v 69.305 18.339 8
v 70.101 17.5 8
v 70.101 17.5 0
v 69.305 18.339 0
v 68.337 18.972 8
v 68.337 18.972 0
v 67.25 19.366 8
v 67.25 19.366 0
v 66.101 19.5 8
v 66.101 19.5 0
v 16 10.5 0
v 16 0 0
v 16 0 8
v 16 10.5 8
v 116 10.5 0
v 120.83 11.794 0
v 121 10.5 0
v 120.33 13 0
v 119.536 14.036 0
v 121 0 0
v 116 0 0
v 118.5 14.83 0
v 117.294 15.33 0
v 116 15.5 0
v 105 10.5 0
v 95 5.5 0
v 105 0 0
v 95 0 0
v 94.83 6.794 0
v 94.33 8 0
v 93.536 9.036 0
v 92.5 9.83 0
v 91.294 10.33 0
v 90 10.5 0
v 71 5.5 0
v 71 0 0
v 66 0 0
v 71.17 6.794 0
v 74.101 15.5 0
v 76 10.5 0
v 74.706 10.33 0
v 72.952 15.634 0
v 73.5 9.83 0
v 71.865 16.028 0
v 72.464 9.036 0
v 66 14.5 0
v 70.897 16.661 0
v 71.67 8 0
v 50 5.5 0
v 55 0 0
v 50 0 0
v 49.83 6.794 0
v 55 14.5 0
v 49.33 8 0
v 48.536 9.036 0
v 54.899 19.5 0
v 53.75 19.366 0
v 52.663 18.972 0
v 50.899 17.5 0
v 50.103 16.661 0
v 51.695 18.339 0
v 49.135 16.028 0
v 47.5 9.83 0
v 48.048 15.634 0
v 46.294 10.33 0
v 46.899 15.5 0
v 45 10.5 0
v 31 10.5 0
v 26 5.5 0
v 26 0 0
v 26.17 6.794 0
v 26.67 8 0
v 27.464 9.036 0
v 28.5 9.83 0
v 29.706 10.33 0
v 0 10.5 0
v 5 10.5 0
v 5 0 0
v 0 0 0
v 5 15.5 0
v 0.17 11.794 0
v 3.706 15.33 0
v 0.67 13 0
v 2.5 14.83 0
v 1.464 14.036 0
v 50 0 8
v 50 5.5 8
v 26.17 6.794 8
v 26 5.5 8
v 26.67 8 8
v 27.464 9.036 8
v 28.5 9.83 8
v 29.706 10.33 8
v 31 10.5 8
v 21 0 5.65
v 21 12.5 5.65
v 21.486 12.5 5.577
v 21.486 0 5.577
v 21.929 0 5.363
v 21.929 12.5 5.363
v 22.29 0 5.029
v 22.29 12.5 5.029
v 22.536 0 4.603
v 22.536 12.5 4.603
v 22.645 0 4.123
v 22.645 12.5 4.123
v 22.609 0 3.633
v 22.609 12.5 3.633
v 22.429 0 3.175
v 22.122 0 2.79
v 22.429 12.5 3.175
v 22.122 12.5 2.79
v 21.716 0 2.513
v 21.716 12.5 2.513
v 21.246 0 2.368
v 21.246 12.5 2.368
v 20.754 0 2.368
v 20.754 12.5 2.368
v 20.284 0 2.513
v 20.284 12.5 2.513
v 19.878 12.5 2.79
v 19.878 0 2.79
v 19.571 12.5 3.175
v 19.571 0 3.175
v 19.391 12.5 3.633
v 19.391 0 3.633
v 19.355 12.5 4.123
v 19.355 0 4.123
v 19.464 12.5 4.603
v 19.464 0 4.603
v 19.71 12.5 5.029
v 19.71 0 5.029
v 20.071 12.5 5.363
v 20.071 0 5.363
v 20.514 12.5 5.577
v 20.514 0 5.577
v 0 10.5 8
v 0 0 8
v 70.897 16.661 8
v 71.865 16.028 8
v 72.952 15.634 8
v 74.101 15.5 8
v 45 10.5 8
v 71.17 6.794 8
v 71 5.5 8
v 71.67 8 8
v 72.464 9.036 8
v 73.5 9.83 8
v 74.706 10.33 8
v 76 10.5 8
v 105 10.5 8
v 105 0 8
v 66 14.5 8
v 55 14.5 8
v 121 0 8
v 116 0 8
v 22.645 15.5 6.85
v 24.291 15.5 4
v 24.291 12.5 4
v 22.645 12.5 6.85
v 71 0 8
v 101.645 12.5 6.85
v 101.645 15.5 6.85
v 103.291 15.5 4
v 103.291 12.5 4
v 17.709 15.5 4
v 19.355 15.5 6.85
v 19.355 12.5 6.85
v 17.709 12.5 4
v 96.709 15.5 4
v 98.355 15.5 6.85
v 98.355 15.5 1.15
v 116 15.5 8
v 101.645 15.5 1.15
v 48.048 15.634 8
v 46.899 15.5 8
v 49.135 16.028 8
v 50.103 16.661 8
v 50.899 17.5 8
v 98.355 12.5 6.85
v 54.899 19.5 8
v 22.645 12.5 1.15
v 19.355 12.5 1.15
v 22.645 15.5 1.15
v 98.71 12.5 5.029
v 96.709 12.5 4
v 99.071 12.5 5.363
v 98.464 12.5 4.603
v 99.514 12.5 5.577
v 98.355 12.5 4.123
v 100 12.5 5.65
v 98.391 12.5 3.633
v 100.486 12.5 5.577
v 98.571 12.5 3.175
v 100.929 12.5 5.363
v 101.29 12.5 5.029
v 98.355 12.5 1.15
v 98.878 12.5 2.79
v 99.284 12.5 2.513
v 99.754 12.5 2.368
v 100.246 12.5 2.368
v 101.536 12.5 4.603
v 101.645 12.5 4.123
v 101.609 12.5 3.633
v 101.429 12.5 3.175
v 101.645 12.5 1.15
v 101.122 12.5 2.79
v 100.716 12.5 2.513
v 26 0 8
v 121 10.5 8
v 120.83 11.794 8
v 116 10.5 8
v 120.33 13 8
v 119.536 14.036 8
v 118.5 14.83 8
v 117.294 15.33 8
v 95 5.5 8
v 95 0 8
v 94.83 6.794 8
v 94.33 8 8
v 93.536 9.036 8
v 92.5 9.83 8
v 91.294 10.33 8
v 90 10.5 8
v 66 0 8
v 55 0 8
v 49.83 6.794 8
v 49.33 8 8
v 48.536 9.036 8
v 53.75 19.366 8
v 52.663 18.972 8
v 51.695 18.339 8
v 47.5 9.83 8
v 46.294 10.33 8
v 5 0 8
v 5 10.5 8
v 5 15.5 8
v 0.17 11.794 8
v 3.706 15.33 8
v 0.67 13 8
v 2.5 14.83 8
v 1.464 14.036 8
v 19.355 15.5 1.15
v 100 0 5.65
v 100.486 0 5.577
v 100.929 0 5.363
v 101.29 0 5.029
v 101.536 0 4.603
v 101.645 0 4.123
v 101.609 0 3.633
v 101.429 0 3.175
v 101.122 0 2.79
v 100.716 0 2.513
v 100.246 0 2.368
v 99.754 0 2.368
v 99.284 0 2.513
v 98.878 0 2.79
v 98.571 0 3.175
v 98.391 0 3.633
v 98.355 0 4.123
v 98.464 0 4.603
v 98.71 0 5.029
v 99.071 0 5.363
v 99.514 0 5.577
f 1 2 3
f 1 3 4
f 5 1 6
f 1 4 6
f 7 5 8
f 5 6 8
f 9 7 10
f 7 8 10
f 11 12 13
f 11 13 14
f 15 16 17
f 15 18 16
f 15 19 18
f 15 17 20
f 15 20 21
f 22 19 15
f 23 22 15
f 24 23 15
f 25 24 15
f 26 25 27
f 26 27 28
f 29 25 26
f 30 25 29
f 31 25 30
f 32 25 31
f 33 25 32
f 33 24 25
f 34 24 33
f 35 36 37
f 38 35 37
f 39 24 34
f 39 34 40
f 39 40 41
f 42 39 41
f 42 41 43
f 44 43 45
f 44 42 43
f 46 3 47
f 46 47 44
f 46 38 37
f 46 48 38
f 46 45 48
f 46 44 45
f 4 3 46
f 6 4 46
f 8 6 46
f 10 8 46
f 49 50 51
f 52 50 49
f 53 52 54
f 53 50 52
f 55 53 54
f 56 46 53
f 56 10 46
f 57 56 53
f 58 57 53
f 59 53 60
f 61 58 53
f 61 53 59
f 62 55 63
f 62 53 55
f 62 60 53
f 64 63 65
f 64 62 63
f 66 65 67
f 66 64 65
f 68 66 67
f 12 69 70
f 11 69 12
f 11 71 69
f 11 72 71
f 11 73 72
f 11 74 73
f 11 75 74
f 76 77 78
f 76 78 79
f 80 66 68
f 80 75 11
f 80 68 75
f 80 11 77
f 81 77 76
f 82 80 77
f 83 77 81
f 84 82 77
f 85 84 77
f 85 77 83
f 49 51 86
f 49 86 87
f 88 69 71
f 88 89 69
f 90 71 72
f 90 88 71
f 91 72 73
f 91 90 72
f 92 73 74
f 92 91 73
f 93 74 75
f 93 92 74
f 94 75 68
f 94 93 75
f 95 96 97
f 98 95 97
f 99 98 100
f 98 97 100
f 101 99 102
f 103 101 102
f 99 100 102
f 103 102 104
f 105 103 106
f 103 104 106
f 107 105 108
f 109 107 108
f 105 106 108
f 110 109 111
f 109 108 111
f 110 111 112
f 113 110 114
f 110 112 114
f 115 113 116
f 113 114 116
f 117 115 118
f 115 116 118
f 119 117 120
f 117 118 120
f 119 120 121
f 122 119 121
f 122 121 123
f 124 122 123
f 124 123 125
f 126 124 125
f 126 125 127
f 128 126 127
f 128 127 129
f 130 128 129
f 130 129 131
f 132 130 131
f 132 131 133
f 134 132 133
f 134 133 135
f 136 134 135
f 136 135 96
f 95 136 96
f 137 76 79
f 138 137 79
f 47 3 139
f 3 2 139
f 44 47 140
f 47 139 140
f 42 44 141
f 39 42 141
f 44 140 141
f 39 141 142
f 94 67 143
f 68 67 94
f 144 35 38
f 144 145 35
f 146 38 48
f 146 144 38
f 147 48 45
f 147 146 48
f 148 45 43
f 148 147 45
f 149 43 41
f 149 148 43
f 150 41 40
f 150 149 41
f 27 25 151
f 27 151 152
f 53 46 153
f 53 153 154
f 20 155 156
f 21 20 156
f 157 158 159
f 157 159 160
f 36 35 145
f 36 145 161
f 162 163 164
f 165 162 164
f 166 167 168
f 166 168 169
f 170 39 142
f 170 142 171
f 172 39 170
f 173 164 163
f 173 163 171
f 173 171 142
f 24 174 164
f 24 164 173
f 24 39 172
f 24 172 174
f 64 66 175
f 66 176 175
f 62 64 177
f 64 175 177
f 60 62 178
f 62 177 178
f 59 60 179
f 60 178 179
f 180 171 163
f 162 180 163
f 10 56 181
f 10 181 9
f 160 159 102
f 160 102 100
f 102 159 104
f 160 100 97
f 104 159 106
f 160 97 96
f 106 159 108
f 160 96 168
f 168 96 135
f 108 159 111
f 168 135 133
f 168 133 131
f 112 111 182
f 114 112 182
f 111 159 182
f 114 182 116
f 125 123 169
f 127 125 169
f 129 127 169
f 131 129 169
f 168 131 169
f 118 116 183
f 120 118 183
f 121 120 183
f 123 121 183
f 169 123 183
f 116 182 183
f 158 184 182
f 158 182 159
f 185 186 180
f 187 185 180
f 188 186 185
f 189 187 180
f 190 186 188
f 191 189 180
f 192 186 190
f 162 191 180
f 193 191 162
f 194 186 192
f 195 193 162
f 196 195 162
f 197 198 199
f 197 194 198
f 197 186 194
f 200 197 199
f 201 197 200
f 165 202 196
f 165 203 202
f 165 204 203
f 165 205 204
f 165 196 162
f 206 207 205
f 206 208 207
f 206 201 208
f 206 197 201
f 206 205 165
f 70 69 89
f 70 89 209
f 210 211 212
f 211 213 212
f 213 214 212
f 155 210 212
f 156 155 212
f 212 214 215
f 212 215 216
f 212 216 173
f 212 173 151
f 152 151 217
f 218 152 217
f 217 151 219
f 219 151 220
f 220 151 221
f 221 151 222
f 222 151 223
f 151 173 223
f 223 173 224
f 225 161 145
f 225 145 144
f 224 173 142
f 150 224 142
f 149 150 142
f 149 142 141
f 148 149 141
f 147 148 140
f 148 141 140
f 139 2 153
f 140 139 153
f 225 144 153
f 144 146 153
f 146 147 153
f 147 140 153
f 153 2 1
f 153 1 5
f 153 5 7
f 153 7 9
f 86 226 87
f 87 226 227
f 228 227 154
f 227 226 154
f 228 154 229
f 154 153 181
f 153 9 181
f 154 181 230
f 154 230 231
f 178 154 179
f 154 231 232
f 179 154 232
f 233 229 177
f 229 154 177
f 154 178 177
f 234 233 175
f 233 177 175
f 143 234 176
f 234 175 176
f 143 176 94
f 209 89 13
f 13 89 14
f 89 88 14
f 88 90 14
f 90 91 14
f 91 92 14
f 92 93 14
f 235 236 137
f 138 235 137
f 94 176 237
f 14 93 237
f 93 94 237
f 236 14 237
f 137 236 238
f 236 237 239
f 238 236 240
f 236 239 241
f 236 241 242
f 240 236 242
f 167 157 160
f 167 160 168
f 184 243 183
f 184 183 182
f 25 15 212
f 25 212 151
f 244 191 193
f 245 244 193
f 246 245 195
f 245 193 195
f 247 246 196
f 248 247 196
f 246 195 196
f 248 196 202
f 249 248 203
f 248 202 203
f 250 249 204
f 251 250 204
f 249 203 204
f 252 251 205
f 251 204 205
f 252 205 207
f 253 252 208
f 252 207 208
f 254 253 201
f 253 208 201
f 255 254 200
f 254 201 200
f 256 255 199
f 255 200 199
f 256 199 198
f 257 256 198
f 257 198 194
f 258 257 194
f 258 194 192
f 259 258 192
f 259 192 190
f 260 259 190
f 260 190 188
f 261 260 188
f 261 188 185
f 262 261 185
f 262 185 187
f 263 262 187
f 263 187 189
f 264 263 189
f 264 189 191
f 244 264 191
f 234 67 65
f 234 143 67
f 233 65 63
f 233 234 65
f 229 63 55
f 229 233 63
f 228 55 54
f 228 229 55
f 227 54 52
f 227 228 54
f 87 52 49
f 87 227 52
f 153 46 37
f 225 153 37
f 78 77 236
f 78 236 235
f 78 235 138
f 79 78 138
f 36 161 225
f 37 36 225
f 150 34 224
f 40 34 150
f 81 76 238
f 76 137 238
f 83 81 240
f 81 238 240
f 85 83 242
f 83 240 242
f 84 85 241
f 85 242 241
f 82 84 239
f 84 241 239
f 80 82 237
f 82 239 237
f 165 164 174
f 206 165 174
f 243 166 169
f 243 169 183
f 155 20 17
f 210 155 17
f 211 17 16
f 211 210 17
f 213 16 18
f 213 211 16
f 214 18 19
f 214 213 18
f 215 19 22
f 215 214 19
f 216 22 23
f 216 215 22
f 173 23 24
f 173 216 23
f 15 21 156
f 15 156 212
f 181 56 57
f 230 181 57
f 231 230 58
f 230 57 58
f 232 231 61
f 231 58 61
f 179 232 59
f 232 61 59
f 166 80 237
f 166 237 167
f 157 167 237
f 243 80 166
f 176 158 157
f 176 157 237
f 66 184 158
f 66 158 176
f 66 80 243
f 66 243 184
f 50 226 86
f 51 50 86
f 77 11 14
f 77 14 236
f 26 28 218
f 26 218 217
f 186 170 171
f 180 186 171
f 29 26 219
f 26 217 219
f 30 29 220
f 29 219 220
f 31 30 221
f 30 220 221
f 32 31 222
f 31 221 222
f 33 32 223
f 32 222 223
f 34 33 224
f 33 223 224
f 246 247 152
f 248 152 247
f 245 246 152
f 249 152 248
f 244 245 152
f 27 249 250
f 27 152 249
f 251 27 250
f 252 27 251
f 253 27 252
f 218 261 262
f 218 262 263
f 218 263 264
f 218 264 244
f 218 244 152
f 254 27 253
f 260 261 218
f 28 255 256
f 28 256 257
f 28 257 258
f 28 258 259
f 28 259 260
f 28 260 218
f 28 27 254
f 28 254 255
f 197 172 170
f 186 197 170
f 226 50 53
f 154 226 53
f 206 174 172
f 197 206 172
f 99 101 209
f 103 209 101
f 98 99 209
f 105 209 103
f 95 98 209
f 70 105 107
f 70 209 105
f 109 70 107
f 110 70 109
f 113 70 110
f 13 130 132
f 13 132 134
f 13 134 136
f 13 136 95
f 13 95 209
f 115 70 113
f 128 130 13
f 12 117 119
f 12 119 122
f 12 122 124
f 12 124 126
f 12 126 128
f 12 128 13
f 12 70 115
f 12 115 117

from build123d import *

# Parameters (mm, degrees)
BOSS_EXTRU_1_DEPTH      = 8
ENL_V_MAT_EXTRU_1_REACH = 124.251
ESQUISSE2_R             = 1.65
CONG_1_R                = 5
ENL_V_MAT_EXTRU_2_DEPTH = 3
CONG_2_R                = 5
CONG_3_R                = 5
CONG_4_R                = 5


with BuildPart() as part:
    # Esquisse1 → Boss.-Extru.1 (new body)
    with BuildSketch(Plane.XY):
        Polygon((0, 10.5), (0, 15.5), (50, 15.5), (50, 19.5), (71, 19.5), (71, 15.5), (121, 15.5), (121, 10.5), (121, 0), (116, 0), (116, 10.5), (105, 10.5), (105, 0), (95, 0), (95, 10.5), (71, 10.5), (71, 0), (66, 0), (66, 10.5), (66, 14.5), (55, 14.5), (55, 10.5), (55, 0), (50, 0), (50, 10.5), (26, 10.5), (26, 0), (16, 0), (16, 10.5), (5, 10.5), (5, 0), (0, 0), align=None)
    extrude(amount=BOSS_EXTRU_1_DEPTH)

    # Esquisse2 → Enlèv. mat.-Extru.1 (cut, up to next)
    with BuildSketch(Plane(origin=(0, 15.5, 0), x_dir=(1, 0, 0), z_dir=(0, 1, 0)), mode=Mode.PRIVATE) as enl_v_mat_extru_1_sk1:
        with Locations(Location((21, -4, 0), (0, 0, 270))):
            Circle(ESQUISSE2_R)
    enl_v_mat_extru_1_tool1 = extrude(enl_v_mat_extru_1_sk1.sketch, amount=-ENL_V_MAT_EXTRU_1_REACH, mode=Mode.PRIVATE) & part.part
    # Esquisse2 → Enlèv. mat.-Extru.1 (cut, up to next)
    with BuildSketch(Plane(origin=(0, 15.5, 0), x_dir=(1, 0, 0), z_dir=(0, 1, 0)), mode=Mode.PRIVATE) as enl_v_mat_extru_1_sk2:
        with Locations(Location((100, -4, 0), (0, 0, 270))):
            Circle(ESQUISSE2_R)
    enl_v_mat_extru_1_tool2 = extrude(enl_v_mat_extru_1_sk2.sketch, amount=-ENL_V_MAT_EXTRU_1_REACH, mode=Mode.PRIVATE) & part.part
    add(enl_v_mat_extru_1_tool1.solids().sort_by_distance((21, 15.5, 4))[0], mode=Mode.SUBTRACT)
    add(enl_v_mat_extru_1_tool2.solids().sort_by_distance((100, 15.5, 4))[0], mode=Mode.SUBTRACT)

    # Congé1
    # the kernel refuses this fillet: 5 mm, written as the material it takes off along each edge
    with BuildSketch(Plane(origin=(50, 19.5, -12.247448714), x_dir=(1.568523089189919e-12, -1.0, 0), z_dir=(0, 0, 1))) as cong_1_piece_1:
        with BuildLine():
            CenterArc((5, 4.898979486), CONG_1_R, 180, 78.463040967)
            Line((0, 4.898979486), (-0.1, 4.898979486))
            Line((-0.1, 4.898979486), (-0.1, 0))
            Line((-0.1, 0), (0, -0.1))
            ThreePointArc((0, -0.1), (2, -0.1), (3.98, -0.09797959))
            Line((3.98, -0.09797959), (4, 0))
        make_face()
    extrude(amount=32.494897428, mode=Mode.SUBTRACT)
    with BuildSketch(Plane(origin=(71, 19.5, -12.247448714), x_dir=(-1, 0, 0), z_dir=(0, 0, 1))) as cong_1_piece_2:
        with BuildLine():
            CenterArc((4.898979486, 5), CONG_1_R, 191.536959033, 78.463040967)
            Line((0, 4), (-0.09797959, 3.98))
            ThreePointArc((-0.09797959, 3.98), (-0.1, 2), (-0.1, 0))
            Line((-0.1, 0), (0, -0.1))
            Line((0, -0.1), (4.898979486, -0.1))
            Line((4.898979486, -0.1), (4.898979486, 0))
        make_face()
    extrude(amount=32.494897428, mode=Mode.SUBTRACT)

    # Esquisse3 → Enlèv. mat.-Extru.2 (cut)
    with BuildSketch(Plane(origin=(0, 15.5, 0), x_dir=(1, 0, 0), z_dir=(0, 1, 0))):
        Polygon((19.354551733, -1.15), (22.645448267, -1.15), (24.290896534, -4), (22.645448267, -6.85), (19.354551733, -6.85), (17.709103466, -4), align=None)
        Polygon((103.290896534, -4), (101.645448267, -1.15), (98.354551733, -1.15), (96.709103466, -4), (98.354551733, -6.85), (101.645448267, -6.85), align=None)
    extrude(amount=-ENL_V_MAT_EXTRU_2_DEPTH, mode=Mode.SUBTRACT)

    # Congé2
    cong_2_edges = [part.edges().sort_by_distance(p)[0] for p in [
        (0, 15.5, 4),
        (121, 15.5, 4),
    ]]
    fillet(cong_2_edges, radius=CONG_2_R)

    # Congé3
    cong_3_edges = [part.edges().sort_by_distance(p)[0] for p in [
        (95, 10.5, 4),
        (71, 10.5, 4),
        (50, 10.5, 4),
        (26, 10.5, 4),
    ]]
    fillet(cong_3_edges, radius=CONG_3_R)

    # Congé4
    cong_4_edges = [part.edges().sort_by_distance(p)[0] for p in [
        (50, 15.5, 4),
        (71, 15.5, 4),
    ]]
    fillet(cong_4_edges, radius=CONG_4_R)


solid = part.part
